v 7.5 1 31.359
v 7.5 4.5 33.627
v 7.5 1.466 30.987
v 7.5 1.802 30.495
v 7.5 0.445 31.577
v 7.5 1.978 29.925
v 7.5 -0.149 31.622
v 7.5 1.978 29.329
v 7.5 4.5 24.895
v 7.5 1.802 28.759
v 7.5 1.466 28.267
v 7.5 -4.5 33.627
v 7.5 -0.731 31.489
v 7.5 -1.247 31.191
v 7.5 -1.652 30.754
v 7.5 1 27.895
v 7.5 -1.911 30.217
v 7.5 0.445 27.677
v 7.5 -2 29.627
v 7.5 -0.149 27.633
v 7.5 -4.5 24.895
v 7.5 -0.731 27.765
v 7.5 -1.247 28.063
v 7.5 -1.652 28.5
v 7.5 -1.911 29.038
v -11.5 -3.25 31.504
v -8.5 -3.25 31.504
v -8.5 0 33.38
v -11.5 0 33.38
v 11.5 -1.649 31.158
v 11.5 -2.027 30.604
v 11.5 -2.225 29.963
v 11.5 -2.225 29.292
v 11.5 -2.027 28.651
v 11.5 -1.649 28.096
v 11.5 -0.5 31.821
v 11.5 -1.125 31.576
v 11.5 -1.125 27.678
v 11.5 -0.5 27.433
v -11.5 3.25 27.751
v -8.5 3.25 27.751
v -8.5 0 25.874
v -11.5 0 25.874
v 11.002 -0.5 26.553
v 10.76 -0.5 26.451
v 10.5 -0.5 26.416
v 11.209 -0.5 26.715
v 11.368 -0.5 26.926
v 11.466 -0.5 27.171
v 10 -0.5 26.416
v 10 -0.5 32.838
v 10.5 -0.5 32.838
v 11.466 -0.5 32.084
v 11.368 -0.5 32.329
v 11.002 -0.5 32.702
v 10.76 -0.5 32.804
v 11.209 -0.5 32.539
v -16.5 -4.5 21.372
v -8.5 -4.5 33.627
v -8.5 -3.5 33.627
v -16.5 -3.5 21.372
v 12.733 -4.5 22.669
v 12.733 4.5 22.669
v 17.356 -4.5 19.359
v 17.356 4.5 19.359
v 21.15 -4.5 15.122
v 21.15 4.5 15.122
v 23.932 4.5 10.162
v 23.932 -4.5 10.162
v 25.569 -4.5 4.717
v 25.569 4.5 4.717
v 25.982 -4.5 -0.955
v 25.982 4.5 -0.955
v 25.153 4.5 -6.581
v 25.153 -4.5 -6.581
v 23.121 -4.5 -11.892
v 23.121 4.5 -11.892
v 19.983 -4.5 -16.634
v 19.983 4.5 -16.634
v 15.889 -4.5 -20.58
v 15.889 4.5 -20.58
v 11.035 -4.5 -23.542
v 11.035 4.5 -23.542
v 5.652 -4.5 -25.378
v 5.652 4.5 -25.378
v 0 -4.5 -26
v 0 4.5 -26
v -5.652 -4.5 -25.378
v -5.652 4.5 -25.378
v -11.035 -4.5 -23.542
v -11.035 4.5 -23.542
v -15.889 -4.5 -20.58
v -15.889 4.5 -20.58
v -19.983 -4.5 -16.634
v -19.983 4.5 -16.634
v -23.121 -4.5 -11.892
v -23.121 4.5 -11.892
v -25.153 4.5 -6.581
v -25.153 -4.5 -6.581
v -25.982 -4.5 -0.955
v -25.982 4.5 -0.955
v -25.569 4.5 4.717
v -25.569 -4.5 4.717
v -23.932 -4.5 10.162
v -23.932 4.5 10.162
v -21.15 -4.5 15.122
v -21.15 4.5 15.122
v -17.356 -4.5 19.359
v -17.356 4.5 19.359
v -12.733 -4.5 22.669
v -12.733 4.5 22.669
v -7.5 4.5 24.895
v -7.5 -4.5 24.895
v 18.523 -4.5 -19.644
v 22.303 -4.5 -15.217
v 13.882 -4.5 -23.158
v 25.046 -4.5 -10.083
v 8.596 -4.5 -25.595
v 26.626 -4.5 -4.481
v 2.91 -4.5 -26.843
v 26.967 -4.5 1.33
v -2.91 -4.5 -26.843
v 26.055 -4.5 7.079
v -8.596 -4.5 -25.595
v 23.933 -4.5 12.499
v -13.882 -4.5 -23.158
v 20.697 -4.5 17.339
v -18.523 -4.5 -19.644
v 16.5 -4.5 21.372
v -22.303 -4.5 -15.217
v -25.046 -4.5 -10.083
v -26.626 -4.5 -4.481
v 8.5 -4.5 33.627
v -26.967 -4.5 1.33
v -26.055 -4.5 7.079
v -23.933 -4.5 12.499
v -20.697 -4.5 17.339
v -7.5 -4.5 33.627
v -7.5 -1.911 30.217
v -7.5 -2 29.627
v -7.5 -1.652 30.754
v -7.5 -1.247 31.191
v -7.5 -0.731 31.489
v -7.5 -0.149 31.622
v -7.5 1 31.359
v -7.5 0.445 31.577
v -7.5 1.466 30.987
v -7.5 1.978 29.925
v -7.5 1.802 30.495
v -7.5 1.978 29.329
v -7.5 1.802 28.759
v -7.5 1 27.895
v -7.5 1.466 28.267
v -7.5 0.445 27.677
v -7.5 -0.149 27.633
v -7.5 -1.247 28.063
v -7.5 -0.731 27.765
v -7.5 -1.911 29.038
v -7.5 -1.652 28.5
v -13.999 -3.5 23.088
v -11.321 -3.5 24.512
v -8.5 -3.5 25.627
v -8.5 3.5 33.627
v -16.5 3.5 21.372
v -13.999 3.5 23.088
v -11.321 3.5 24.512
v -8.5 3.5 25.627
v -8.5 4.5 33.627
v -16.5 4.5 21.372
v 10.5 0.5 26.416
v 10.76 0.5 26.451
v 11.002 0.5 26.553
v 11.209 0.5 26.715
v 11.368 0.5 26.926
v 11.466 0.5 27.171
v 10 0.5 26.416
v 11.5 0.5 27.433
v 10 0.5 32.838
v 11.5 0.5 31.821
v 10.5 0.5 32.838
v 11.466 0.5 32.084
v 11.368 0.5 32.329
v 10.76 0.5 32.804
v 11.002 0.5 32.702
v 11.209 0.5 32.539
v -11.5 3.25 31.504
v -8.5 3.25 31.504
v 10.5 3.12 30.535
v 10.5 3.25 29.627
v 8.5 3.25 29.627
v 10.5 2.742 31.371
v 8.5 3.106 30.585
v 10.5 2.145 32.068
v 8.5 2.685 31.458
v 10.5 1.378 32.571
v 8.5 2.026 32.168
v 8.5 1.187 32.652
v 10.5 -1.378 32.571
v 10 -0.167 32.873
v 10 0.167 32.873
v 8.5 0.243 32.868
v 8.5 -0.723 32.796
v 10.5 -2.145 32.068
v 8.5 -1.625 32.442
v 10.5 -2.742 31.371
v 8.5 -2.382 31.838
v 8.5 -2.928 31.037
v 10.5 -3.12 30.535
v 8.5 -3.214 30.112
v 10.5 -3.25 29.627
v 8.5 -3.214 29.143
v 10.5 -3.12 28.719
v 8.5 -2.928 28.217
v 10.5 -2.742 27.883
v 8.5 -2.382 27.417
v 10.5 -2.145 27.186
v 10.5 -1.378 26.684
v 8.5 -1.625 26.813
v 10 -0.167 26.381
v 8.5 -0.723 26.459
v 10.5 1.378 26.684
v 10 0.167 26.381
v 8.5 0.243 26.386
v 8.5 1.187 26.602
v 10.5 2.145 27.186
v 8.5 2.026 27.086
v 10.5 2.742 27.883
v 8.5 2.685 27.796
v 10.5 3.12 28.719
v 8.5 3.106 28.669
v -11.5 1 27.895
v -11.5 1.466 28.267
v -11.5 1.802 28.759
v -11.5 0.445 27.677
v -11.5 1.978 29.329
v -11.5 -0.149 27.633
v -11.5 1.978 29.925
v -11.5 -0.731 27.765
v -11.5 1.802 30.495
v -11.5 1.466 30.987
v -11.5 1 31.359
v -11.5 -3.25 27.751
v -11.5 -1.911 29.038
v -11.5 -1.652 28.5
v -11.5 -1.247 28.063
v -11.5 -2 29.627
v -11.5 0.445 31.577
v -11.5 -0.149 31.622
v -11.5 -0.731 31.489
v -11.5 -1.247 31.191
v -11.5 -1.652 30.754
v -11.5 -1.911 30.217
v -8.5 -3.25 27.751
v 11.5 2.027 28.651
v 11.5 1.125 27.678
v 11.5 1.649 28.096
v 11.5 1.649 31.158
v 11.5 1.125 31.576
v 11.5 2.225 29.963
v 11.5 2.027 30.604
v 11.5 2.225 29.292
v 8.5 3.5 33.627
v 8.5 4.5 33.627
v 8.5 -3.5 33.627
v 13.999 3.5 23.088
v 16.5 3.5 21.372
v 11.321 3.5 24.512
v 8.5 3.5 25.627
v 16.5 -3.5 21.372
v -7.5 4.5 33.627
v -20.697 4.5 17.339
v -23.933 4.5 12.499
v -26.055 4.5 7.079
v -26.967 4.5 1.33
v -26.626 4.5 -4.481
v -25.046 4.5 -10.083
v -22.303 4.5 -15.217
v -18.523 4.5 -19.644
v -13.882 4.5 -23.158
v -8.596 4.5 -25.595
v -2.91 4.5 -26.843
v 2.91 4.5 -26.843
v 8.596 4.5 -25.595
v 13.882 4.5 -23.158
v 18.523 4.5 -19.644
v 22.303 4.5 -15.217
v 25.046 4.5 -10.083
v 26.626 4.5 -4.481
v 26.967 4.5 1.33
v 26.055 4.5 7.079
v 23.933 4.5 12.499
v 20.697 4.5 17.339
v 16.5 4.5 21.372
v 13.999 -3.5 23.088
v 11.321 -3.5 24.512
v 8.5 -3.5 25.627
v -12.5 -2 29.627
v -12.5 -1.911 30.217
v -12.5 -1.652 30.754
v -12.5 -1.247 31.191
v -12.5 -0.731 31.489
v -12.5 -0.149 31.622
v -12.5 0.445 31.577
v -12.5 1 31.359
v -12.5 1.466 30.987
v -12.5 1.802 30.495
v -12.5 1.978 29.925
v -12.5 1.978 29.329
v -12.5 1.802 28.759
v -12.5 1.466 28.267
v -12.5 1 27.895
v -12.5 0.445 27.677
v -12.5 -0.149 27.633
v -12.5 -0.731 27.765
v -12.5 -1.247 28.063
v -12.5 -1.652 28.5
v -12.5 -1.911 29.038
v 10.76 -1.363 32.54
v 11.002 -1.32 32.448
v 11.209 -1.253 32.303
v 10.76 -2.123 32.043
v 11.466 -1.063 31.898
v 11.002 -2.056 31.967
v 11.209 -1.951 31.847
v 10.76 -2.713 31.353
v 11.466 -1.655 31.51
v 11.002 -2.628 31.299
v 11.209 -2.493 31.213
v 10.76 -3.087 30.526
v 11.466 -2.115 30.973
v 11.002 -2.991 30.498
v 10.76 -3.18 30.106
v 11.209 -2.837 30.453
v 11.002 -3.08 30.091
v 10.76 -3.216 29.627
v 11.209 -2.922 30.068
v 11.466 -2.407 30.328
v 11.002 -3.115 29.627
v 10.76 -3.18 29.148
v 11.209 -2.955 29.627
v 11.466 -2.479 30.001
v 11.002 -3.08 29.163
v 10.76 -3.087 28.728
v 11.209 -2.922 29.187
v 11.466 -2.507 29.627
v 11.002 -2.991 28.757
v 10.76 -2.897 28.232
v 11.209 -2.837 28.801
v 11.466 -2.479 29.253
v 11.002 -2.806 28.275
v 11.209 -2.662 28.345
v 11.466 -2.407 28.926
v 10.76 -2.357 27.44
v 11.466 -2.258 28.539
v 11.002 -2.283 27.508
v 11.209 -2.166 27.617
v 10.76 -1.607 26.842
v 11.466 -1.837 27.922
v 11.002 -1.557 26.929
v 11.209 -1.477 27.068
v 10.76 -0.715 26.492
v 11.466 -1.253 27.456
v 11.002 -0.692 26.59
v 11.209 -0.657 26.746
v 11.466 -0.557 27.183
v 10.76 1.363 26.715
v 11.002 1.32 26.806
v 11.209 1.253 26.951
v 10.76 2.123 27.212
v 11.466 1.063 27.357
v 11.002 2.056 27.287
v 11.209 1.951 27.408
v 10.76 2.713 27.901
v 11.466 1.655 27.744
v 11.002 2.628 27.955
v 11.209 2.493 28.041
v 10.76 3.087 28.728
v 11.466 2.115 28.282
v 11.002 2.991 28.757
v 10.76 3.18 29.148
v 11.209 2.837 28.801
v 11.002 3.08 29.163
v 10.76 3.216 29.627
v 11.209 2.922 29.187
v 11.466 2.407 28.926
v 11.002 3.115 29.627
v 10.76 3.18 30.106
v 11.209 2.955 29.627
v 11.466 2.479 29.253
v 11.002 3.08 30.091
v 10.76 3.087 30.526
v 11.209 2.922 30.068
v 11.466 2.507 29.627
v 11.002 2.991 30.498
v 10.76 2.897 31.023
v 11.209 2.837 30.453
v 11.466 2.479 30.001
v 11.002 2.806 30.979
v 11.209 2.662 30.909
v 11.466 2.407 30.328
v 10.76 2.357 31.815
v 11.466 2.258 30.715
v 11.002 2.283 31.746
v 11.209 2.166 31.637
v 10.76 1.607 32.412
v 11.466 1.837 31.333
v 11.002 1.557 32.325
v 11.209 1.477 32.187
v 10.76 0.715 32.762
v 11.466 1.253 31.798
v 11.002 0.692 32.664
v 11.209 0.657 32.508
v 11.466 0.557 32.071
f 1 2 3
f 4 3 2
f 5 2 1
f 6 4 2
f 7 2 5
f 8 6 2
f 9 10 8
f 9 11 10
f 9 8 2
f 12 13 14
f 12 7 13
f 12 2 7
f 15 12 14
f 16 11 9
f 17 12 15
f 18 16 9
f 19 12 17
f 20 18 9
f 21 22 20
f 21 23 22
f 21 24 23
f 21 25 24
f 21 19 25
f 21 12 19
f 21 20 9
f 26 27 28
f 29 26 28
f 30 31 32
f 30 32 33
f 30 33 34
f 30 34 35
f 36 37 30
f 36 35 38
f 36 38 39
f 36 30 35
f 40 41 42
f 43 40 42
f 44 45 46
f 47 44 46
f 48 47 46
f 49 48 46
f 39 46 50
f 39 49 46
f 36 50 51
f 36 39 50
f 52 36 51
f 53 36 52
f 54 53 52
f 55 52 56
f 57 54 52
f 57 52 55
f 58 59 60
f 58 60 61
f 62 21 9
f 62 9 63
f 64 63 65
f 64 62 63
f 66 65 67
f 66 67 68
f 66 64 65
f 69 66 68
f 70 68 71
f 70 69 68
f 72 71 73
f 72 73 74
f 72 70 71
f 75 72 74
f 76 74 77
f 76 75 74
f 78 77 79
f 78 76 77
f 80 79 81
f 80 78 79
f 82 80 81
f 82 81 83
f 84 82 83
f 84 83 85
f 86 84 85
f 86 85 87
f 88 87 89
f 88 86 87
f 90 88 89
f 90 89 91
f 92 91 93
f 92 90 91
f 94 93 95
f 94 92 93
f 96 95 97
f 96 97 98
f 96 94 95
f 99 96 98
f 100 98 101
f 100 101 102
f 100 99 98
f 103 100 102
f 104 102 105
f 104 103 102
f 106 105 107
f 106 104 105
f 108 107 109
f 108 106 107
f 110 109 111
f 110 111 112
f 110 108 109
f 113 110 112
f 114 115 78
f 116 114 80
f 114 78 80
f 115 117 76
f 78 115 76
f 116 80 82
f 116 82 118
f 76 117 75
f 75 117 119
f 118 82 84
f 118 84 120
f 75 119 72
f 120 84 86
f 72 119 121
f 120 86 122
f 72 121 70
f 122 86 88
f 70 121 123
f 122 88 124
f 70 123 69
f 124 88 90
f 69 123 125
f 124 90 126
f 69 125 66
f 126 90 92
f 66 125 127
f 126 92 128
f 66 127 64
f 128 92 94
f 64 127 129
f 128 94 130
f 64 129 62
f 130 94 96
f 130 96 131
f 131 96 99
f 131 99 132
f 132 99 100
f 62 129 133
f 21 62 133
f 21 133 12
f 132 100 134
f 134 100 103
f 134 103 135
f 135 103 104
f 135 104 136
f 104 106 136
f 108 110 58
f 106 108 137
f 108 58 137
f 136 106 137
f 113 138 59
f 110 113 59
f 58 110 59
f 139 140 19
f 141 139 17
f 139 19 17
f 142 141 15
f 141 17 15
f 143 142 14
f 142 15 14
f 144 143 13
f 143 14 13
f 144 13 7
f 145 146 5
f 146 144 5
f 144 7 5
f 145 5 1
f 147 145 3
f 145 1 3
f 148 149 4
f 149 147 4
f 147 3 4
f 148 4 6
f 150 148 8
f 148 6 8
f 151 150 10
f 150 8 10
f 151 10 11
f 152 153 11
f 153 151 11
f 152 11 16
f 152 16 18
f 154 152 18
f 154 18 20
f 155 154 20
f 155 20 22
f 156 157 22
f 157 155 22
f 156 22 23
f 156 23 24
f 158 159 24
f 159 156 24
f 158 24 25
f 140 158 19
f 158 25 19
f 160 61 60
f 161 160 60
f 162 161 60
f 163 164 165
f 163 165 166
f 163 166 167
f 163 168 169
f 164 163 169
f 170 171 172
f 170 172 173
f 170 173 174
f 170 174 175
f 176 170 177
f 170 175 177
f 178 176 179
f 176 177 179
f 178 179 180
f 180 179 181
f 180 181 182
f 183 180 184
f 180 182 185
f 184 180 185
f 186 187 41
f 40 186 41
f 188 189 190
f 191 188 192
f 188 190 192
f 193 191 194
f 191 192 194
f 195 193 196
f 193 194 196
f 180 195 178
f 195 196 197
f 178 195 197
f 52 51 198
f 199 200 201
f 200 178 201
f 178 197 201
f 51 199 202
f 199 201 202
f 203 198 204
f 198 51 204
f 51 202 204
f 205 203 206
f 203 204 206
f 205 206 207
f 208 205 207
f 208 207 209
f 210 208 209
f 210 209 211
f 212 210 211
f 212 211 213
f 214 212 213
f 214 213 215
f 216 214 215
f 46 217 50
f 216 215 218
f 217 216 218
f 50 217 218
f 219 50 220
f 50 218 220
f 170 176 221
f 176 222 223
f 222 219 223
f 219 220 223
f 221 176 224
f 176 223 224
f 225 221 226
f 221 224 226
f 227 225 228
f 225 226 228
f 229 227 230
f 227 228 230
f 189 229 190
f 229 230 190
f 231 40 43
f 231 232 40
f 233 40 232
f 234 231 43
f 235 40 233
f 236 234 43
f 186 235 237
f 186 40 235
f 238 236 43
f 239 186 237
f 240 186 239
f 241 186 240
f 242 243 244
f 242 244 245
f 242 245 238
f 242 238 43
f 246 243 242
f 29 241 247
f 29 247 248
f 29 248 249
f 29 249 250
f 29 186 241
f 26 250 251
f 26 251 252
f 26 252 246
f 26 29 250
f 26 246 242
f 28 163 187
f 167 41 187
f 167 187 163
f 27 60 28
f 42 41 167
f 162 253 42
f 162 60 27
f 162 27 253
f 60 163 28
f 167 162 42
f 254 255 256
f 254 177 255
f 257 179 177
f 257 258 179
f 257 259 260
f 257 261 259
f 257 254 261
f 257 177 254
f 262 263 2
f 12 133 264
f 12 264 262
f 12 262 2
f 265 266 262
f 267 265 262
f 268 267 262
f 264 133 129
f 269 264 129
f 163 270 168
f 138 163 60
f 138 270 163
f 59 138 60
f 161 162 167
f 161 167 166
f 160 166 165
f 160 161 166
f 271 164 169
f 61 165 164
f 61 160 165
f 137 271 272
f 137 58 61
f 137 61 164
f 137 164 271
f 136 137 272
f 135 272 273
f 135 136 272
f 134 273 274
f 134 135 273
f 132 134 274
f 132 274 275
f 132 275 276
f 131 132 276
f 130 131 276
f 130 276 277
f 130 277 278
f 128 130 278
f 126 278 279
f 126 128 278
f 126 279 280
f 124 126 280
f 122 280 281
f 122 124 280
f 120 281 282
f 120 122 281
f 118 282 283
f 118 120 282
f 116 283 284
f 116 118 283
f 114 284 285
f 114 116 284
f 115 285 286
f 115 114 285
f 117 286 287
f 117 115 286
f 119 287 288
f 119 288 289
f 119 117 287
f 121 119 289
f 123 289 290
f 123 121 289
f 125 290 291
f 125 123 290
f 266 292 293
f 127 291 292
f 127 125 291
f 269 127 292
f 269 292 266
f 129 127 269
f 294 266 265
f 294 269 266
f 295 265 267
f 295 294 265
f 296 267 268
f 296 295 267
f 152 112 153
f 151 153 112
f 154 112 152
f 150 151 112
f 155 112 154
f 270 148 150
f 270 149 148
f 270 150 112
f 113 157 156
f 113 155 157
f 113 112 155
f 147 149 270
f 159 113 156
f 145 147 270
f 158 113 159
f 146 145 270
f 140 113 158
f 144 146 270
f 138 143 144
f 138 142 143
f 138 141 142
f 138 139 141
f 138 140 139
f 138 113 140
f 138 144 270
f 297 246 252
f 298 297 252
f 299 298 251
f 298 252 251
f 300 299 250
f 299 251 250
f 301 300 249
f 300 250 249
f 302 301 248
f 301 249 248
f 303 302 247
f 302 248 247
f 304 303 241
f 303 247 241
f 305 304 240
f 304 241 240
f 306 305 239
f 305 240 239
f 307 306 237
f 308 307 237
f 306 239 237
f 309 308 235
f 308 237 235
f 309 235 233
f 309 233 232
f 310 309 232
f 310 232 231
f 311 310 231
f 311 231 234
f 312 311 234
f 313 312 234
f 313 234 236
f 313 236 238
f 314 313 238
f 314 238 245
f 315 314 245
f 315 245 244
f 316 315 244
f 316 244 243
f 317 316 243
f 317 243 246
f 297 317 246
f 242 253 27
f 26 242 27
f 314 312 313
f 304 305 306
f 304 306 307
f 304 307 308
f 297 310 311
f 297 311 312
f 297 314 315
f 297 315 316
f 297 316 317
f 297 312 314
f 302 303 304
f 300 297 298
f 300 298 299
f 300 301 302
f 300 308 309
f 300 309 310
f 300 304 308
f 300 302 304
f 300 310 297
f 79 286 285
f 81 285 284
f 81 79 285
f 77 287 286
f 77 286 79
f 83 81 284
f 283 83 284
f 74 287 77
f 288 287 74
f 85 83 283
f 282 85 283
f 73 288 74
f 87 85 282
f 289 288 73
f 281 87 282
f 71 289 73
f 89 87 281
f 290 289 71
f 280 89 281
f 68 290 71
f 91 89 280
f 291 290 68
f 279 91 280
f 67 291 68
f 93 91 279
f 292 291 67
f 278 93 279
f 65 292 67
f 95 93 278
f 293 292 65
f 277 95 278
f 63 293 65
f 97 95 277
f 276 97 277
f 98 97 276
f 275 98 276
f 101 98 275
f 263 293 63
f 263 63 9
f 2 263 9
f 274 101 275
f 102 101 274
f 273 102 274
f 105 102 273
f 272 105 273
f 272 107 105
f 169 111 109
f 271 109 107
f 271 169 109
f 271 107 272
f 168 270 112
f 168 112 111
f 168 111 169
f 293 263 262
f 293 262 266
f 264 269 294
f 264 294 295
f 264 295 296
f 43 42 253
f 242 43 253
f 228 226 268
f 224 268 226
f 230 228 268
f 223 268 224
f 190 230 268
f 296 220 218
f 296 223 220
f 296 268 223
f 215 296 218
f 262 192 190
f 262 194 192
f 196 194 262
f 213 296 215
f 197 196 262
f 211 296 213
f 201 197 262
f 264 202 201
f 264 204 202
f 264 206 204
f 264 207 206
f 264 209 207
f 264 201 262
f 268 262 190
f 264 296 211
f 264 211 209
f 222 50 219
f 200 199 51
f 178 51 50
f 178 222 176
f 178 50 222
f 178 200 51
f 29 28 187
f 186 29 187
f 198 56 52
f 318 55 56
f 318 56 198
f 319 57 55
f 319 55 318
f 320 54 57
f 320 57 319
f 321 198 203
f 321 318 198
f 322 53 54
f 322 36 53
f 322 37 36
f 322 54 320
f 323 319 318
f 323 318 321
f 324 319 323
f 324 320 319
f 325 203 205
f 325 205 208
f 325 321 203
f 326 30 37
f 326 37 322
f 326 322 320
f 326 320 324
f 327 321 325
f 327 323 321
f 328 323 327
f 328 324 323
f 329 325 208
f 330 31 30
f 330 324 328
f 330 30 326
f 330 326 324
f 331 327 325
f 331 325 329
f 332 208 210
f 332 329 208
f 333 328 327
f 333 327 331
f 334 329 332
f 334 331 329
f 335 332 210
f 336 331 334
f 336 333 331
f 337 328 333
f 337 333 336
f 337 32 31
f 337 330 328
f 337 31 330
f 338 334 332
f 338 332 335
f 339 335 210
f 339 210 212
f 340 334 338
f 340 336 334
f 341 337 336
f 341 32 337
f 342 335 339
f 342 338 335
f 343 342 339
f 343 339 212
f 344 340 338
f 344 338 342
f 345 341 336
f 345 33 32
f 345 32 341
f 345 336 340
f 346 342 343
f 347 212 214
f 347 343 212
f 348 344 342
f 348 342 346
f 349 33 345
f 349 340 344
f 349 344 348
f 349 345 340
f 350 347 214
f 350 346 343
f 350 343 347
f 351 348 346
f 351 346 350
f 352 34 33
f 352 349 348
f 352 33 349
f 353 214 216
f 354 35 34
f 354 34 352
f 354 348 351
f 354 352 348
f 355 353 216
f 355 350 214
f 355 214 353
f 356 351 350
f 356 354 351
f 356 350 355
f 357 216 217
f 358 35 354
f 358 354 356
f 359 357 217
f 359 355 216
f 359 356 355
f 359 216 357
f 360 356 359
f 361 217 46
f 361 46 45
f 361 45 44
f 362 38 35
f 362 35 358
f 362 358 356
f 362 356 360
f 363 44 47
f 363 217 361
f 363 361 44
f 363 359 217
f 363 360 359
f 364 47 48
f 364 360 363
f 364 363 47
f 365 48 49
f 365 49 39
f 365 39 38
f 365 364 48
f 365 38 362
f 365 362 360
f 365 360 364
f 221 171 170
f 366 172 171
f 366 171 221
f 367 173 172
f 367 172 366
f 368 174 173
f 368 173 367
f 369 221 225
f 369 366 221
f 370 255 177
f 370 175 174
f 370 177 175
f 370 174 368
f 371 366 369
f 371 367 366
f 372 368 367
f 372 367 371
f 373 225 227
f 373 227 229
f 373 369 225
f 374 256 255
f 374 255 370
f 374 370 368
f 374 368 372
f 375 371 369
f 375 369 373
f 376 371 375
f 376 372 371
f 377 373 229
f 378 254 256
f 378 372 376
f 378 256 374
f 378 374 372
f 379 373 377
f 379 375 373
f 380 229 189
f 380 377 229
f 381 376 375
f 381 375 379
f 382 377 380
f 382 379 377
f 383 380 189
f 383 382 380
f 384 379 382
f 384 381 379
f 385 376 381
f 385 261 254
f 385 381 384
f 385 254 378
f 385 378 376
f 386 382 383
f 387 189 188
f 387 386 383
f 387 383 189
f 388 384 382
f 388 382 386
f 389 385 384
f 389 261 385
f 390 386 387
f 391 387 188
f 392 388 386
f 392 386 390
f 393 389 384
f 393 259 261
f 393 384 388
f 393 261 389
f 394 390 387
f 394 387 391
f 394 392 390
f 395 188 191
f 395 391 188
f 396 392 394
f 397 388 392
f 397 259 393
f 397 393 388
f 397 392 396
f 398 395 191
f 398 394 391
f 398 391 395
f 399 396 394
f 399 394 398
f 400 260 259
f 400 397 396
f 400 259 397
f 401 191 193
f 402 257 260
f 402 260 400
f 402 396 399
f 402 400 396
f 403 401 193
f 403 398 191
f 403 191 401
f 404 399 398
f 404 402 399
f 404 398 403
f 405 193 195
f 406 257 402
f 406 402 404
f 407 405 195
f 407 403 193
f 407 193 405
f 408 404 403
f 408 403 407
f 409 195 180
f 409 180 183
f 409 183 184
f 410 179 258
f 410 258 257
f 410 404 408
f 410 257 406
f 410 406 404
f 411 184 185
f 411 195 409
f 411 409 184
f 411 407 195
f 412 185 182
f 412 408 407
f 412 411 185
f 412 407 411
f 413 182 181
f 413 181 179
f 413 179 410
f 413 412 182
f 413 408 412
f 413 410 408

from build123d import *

# Parameters (mm, degrees)
F1_DEPTH         = 4.5
F3_DEPTH         = 1
F3_COPIES2_COUNT = 2
F5_DEPTH         = 3
F6_R             = 3.25
F7_DEPTH         = 3
F8_R             = 2
F9_DEPTH         = 20
F10_W            = 1
F10_H            = 6.5
F11_DEPTH        = 1.5
F12_R            = 1


# Not quite as in the source:
# - a pattern or mirror of a feature is missing from the dataset's text; its kind, count and spacing are read off the source's solid


with BuildPart() as f1:
    # F0 (on Front) → F1 (new body, symmetric)
    with BuildSketch(Plane.XZ):
        with BuildLine():
            Line((-8.5, 33.6271340575), (-8.5, 25.6271340575))
            ThreePointArc((-8.5, 25.6271340575), (0, -27), (8.5, 25.6271340575))
            Line((8.5, 25.6271340575), (8.5, 33.6271340575))
            Line((8.5, 33.6271340575), (7.5, 33.6271340575))
            Line((7.5, 33.6271340575), (7.5, 24.894778569))
            ThreePointArc((7.5, 24.894778569), (0, -26), (-7.5, 24.894778569))
            Line((-7.5, 24.894778569), (-7.5, 33.6271340575))
            Line((-7.5, 33.6271340575), (-8.5, 33.6271340575))
        make_face()
    extrude(amount=F1_DEPTH, both=True)

    # F2 (on face) → F3 (join)
    with BuildSketch(Plane.XZ.offset(4.5)):
        with BuildLine():
            Line((-8.5, 25.6271340575), (-8.5, 33.6271340575))
            Line((-8.5, 33.6271340575), (-16.5, 21.3717102732))
            ThreePointArc((-16.5, 21.3717102732), (-12.6797932907, 23.8374252407), (-8.5, 25.6271340575))
        make_face()
    f3 = extrude(amount=-F3_DEPTH)

    # F3_copies: F3 across plane
    add(f3.mirror(Plane.ZX))

    # F3_copies1: F3 across plane
    add(f3.mirror(Plane(origin=(0, 0, 0), x_dir=(0, 0, 1), z_dir=(1, 0, 0))))

    # F3_copies2: F3 ×2 about axis
    f3_copies2_axis = Axis((0, 0, 0), (0, 0, 1))
    for i in range(1, F3_COPIES2_COUNT):
        add(f3.rotate(f3_copies2_axis, i * 360 / F3_COPIES2_COUNT))

    # F4 (on face) → F5 (join)
    with BuildSketch(Plane(origin=(-8.5, 0, 0), x_dir=(0, -1, 0), z_dir=(-1, 0, 0))):
        Polygon((-3.25, 31.5035224323), (-3.25, 27.7507456826), (0, 25.8743573077), (3.25, 27.7507456826), (3.25, 31.5035224323), (0, 33.3799108072), align=None)
    extrude(amount=F5_DEPTH)

    # F6 (on face) → F7 (join)
    with BuildSketch(Plane.YZ.offset(8.5)):
        with Locations((0, 29.6271340575)):
            Circle(F6_R)
    extrude(amount=F7_DEPTH)

    # F8 (on face) → F9 (join)
    with BuildSketch(Plane(origin=(7.5, 0, 0), x_dir=(0, -1, 0), z_dir=(-1, 0, 0))):
        with Locations((0, 29.6271340575)):
            Circle(F8_R)
    extrude(amount=F9_DEPTH)

    # F10 (on face) → F11 (cut)
    with BuildSketch(Plane.YZ.offset(11.5)):
        with Locations((0, 29.6271340575)):
            Rectangle(F10_W, F10_H)
    extrude(amount=-F11_DEPTH, mode=Mode.SUBTRACT)

    # F12
    f12_edges = [f1.edges().sort_by_distance(p)[0] for p in [
        (11.5, -3.25, 29.627134),
        (11.5, 2.468552, 31.741076),
        (11.5, 2.468552, 27.513192),
    ]]
    fillet(f12_edges, radius=F12_R)


solid = f1.part
